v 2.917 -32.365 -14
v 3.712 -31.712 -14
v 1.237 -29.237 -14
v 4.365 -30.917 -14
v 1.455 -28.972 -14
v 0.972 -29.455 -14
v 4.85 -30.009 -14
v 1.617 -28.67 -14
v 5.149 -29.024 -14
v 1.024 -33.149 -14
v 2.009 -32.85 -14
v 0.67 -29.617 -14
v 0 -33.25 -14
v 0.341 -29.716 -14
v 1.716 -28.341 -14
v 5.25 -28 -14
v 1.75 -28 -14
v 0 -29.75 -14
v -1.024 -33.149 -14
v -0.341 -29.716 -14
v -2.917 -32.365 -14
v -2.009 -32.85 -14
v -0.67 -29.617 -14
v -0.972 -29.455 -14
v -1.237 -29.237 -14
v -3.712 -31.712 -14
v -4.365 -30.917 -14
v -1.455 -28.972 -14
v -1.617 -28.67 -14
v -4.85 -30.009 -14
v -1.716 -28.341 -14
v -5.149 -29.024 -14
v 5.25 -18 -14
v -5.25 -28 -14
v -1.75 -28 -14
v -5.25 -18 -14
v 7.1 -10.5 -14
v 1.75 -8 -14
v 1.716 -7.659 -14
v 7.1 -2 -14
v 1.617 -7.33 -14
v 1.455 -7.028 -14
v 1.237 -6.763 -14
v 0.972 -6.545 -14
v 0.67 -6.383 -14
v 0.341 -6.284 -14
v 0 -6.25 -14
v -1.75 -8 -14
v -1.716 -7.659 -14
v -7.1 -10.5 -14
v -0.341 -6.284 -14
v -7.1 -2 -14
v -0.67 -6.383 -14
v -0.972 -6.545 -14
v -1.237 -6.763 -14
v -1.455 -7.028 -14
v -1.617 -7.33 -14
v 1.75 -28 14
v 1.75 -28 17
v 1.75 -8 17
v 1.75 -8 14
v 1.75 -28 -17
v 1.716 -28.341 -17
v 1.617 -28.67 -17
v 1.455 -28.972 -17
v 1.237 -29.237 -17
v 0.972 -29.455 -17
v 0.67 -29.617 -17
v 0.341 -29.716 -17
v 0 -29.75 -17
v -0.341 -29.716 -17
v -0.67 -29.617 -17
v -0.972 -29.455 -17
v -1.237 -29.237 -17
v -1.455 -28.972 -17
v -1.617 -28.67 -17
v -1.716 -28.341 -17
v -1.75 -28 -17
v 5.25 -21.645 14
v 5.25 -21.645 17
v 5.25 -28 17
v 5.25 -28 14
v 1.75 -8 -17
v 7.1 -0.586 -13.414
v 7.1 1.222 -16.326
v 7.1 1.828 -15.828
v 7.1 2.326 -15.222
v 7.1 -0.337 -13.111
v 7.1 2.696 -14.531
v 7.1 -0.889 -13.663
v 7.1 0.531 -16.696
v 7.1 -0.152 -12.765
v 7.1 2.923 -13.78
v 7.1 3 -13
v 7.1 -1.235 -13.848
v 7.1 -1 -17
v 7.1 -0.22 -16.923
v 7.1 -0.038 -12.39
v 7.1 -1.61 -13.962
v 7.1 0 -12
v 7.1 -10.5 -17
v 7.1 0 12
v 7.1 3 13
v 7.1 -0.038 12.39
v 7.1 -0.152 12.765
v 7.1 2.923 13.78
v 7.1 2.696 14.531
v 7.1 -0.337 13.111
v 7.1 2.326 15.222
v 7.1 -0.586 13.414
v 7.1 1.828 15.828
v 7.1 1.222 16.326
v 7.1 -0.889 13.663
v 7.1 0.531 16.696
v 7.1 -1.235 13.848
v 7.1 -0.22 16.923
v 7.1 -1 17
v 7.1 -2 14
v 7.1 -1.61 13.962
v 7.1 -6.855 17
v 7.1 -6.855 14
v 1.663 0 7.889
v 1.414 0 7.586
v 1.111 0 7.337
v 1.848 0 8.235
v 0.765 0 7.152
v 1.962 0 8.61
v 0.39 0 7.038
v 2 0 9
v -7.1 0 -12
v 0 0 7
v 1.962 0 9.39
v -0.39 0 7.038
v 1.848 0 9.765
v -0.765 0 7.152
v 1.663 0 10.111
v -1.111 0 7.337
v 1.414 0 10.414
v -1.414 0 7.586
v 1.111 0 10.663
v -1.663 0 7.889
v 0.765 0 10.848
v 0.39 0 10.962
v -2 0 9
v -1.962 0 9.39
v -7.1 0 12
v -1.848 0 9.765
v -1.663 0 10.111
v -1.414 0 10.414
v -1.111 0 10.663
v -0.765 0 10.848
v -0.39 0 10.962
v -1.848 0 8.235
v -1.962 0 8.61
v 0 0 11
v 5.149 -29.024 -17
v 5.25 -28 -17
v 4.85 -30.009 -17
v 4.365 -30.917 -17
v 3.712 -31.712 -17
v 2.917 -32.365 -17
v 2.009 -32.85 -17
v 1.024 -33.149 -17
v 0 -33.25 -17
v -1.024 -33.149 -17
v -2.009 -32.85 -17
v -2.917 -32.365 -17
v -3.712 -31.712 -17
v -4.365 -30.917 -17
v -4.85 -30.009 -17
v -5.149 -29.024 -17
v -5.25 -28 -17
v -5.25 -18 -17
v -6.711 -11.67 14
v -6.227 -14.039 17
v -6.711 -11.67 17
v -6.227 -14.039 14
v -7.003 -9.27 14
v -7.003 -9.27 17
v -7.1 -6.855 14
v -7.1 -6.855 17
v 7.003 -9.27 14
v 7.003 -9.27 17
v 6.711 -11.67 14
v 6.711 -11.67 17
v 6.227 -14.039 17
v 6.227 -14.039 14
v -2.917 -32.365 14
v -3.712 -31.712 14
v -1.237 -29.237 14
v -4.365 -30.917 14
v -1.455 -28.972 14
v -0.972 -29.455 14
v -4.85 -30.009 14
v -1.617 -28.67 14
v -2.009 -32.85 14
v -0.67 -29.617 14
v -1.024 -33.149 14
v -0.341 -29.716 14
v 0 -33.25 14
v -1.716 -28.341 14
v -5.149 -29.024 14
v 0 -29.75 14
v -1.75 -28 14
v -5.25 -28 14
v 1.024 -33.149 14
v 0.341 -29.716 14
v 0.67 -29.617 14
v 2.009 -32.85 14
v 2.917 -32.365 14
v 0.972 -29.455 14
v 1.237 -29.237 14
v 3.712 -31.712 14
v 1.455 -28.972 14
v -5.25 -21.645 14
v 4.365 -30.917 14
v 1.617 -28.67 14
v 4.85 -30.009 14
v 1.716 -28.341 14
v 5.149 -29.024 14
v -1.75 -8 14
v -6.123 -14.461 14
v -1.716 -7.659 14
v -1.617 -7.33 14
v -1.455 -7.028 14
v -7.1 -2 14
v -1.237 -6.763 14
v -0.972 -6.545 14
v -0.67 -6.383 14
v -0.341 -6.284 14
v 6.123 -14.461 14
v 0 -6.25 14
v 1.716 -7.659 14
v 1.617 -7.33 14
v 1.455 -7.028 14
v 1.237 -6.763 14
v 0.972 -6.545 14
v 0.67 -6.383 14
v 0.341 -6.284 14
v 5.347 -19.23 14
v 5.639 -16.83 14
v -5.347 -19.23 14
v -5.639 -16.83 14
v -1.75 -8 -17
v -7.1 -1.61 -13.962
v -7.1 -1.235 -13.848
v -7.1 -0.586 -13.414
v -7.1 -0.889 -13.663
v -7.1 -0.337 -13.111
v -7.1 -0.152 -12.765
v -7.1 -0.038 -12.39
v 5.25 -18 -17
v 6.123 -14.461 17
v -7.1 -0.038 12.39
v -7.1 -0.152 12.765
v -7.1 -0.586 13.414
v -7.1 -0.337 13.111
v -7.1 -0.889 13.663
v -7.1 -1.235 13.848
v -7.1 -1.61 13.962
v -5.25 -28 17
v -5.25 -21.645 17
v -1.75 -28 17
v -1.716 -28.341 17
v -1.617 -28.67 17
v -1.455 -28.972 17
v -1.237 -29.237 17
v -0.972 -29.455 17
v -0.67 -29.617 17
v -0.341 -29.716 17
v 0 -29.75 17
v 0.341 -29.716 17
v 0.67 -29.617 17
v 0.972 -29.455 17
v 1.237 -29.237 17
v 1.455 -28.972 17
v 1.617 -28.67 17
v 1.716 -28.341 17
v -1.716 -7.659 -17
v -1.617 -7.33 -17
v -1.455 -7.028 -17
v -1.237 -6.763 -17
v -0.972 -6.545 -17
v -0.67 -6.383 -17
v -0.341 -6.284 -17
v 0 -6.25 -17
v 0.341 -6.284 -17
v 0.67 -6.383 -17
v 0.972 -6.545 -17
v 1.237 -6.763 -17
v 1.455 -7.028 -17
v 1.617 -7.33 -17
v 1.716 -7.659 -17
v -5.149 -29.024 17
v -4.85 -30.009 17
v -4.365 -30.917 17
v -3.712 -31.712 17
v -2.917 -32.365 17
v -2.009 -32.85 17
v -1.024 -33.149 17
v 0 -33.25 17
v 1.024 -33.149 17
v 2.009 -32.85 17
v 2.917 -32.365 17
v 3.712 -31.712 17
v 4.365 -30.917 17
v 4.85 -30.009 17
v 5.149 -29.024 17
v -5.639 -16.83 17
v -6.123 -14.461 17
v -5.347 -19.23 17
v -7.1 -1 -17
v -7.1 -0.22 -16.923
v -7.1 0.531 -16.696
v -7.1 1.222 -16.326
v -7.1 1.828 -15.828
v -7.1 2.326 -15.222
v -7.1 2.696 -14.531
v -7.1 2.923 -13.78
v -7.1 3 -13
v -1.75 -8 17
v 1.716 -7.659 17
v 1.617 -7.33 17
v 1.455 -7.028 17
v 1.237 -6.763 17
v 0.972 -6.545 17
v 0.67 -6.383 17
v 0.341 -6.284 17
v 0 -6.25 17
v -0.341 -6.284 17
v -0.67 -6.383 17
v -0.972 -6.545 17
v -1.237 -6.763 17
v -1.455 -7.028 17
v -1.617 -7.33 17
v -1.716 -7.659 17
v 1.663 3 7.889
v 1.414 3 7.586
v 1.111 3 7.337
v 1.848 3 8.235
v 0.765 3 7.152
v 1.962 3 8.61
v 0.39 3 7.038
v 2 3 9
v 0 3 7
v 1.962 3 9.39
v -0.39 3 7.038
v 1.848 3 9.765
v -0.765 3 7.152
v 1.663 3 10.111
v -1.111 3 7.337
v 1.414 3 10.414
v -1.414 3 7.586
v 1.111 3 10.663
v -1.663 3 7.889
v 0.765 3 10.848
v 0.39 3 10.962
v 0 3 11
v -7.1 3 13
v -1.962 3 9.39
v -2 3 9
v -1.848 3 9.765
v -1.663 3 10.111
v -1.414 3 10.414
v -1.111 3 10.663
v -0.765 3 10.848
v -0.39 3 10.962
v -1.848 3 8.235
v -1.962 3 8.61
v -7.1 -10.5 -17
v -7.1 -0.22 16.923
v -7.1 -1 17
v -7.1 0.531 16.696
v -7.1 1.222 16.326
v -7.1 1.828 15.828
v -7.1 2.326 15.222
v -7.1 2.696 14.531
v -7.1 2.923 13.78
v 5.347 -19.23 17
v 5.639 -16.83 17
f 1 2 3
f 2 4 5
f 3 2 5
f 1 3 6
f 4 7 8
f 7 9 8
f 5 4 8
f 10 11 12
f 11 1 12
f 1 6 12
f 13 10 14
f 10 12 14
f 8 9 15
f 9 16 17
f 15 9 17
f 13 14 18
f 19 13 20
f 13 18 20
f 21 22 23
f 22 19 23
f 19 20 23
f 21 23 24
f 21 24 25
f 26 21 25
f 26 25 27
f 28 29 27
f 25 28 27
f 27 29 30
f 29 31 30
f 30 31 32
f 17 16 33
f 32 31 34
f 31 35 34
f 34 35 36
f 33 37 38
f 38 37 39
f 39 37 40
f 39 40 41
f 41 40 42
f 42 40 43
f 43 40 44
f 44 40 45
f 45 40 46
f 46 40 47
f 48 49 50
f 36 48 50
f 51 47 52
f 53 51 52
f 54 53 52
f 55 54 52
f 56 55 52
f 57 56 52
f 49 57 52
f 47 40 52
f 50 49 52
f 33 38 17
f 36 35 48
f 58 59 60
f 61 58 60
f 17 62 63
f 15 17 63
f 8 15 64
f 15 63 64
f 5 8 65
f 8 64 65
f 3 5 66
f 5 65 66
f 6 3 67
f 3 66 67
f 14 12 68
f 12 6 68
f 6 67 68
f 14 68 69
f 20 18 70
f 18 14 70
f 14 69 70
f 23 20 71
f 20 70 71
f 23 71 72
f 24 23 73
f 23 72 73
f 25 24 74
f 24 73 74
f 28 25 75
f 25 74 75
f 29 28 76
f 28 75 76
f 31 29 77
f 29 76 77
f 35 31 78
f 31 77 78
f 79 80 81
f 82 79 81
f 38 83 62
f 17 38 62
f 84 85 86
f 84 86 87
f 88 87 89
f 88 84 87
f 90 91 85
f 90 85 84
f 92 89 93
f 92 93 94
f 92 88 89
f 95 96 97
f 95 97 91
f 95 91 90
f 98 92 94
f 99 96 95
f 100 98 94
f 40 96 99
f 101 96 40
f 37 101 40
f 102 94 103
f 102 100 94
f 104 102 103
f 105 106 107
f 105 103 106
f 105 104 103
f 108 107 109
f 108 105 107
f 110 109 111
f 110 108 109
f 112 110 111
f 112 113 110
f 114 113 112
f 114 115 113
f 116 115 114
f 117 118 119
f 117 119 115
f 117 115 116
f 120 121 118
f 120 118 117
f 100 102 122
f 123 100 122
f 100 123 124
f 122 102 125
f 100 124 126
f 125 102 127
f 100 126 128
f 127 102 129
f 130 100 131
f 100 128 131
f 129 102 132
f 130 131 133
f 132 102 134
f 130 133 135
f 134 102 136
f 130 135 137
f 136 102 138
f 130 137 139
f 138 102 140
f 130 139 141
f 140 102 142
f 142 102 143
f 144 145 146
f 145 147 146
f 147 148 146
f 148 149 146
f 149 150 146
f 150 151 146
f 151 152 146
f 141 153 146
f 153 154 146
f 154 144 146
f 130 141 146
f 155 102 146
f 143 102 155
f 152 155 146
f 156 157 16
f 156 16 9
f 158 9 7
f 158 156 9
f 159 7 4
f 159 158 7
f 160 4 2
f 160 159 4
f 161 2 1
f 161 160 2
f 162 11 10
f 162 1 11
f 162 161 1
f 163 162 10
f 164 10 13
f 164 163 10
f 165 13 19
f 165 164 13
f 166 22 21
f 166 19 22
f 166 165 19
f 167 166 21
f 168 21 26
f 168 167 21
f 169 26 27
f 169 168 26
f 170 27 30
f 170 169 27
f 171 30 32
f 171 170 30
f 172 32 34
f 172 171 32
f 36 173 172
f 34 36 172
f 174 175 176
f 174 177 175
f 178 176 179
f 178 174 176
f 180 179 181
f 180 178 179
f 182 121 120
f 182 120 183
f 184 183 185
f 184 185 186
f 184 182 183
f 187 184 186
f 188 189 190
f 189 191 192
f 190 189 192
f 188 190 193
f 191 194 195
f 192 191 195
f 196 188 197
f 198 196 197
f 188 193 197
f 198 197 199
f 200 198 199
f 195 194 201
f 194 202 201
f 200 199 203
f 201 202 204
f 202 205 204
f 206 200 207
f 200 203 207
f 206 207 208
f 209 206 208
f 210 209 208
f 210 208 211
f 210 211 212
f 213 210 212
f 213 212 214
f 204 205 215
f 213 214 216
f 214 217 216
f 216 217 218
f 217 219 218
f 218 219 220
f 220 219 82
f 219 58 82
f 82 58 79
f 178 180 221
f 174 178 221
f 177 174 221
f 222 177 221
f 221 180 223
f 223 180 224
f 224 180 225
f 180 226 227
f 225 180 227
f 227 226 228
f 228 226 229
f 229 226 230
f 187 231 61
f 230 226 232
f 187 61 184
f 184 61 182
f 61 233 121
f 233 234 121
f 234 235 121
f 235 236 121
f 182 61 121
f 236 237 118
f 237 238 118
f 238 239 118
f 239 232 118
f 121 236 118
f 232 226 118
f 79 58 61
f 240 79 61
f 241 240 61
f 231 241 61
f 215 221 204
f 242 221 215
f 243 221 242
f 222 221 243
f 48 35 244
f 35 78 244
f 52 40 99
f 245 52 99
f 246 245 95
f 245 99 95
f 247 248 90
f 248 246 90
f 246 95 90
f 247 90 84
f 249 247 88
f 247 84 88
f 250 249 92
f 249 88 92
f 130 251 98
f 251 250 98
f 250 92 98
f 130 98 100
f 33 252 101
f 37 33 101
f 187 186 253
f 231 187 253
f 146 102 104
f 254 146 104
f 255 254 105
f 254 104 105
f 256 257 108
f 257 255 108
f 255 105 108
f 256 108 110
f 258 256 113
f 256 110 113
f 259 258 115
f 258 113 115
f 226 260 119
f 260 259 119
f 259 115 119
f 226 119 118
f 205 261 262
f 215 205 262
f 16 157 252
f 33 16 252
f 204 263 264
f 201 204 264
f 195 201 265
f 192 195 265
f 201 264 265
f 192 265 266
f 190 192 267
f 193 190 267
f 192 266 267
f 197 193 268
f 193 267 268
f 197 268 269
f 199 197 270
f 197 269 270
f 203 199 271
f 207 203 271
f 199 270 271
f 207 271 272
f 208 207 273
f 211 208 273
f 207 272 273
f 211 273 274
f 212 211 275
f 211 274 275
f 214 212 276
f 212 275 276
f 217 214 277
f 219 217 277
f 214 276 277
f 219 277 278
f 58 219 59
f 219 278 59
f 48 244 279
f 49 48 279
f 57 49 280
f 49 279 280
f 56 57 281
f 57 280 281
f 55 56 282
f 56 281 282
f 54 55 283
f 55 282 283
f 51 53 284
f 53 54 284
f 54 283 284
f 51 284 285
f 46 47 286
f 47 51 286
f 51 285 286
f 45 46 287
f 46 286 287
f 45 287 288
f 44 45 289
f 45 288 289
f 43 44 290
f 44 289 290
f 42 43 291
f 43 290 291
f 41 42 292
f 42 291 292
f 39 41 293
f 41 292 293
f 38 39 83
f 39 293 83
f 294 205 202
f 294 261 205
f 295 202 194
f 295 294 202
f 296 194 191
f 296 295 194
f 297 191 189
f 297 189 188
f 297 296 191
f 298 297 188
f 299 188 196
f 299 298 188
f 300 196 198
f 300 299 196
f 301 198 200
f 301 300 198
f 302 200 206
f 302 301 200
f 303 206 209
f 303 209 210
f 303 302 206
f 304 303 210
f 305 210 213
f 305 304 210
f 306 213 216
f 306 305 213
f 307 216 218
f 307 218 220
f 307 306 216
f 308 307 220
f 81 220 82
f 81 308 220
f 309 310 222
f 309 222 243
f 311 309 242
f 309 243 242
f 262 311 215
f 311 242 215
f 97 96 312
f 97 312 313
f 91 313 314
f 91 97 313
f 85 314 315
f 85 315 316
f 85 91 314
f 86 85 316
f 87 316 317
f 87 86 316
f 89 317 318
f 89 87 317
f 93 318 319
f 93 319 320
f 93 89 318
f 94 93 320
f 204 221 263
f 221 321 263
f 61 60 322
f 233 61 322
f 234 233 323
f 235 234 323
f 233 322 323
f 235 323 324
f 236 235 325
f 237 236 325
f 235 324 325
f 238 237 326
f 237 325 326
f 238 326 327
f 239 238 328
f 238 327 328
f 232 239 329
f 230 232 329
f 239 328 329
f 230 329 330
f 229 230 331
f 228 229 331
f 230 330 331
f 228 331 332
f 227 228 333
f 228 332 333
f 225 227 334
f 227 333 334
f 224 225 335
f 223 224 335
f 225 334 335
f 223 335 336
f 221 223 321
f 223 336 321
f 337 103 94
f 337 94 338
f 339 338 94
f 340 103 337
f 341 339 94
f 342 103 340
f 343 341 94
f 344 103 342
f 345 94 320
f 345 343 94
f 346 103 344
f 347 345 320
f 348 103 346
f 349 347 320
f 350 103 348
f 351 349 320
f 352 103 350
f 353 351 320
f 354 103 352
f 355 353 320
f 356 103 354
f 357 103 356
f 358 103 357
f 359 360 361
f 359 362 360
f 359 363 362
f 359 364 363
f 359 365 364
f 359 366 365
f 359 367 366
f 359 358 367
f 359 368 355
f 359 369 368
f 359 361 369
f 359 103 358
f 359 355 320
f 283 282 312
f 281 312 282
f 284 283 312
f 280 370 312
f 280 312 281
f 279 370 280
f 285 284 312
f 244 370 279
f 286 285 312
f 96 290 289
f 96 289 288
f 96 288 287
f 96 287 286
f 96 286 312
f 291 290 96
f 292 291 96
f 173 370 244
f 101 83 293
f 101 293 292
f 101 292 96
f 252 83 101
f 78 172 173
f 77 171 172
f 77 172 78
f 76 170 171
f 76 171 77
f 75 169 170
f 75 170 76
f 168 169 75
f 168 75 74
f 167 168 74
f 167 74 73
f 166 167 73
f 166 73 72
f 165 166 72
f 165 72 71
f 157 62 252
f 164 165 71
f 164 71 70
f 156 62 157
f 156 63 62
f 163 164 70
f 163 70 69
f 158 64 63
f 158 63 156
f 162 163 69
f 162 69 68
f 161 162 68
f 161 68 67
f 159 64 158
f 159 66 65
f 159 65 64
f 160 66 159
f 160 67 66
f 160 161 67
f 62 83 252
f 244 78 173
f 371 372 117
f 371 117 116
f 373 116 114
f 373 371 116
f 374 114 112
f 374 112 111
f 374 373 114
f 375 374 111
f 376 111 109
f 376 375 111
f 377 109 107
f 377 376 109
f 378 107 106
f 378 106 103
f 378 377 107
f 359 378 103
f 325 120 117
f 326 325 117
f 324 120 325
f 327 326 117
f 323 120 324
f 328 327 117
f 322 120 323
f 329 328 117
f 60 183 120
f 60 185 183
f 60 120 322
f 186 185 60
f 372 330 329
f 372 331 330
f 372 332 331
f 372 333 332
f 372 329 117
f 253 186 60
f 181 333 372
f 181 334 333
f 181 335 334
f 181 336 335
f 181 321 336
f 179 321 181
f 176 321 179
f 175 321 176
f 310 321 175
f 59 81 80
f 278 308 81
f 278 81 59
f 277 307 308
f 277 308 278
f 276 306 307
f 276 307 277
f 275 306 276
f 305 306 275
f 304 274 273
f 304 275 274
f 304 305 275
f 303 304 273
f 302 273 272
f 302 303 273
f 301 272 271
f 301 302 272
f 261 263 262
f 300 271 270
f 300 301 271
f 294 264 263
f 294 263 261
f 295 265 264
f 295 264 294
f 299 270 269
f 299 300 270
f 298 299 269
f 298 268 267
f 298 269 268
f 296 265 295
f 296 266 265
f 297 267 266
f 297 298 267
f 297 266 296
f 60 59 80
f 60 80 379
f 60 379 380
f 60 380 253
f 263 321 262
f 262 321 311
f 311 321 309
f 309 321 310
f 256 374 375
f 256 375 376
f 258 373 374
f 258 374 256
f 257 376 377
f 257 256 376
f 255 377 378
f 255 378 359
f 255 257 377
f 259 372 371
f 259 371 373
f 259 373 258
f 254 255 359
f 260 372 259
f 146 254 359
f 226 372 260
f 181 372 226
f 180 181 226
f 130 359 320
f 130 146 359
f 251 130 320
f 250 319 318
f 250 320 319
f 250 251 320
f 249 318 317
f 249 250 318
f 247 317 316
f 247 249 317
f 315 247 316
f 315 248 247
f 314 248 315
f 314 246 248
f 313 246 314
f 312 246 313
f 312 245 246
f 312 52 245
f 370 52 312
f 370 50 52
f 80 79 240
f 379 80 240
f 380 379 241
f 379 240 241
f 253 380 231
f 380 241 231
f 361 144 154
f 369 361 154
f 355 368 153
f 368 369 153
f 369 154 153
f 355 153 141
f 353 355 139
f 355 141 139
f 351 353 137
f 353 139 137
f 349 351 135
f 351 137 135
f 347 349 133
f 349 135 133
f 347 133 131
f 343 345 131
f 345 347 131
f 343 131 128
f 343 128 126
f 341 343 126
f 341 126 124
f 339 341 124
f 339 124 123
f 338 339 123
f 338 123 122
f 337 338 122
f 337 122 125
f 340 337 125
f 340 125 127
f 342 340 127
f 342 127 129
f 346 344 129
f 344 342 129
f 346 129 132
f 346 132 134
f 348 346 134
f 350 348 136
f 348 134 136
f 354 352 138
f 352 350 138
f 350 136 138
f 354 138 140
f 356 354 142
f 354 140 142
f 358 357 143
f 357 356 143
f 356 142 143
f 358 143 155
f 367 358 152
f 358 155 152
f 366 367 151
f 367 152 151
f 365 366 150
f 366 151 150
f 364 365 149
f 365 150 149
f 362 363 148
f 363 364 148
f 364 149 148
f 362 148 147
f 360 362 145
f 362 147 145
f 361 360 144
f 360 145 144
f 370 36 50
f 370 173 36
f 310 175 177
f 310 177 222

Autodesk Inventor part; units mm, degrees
ref_plane "YZ Plane" through (0, 0, 0) normal (1, 0, 0) x (0, 1, 0)
ref_plane "XZ Plane" through (0, 0, 0) normal (0, 1, 0) x (-1, 0, 0)
ref_plane "XY Plane" through (0, 0, 0) normal (0, 0, 1) x (1, 0, 0)
sketch "Sketch1" plane through (0, 0, 0) normal (0, 1, 0) x (-1, 0, 0)
  line L0 (7.1, -17) -> (-7.1, -17)
  line L1 (-7.1, -17) -> (-7.1, 17)
  line L2 (-7.1, 17) -> (7.1, 17)
  line L3 (7.1, 17) -> (7.1, -17)
  line L4 (7.1, -17) -> (-7.1, 17) construction
  line L5 (-7.1, -17) -> (7.1, 17) construction
  circle A0 centre (0, 9) radius 2
  point P0 (0, 0)
  dimension "d0" = 14.2
  dimension "d1" = 34
  dimension "d4" = 4
  dimension "d5" = 8
  dimension "d6" = 7.1
extrude "Extrusion1" add sketch "Sketch1" along normal blind 3
sketch "Sketch2" plane through (-7.1, 0, 17) normal (0, 0, 1) x (1, 0, 0)
  line L0 (7.1, -28) -> (7.1, -8) construction
  line L1 (8.85, -28) -> (8.85, -8)
  line L2 (5.35, -8) -> (5.35, -28)
  arc A0 (5.35, -28) -> (8.85, -28) centre (7.1, -28) ccw
  arc A1 (8.85, -8) -> (5.35, -8) centre (7.1, -8) ccw
  line L3 (0, 0) -> (0, 3) projected
  line L4 (0, 0) -> (14.2, 0) projected
  line L5 (1.85, -28) -> (1.85, -8)
  arc A2 (12.35, -8) -> (1.85, -8) centre (7.1, -8) ccw
  line L6 (12.35, -8) -> (12.35, -28)
  arc A3 (1.85, -28) -> (12.35, -28) centre (7.1, -28) ccw
  line L7 (0, 0) -> (0, -10.5)
  line L8 (0, -10.5) -> (1.85, -18)
  line L9 (14.2, 0) -> (14.2, -10.5)
  line L10 (14.2, -10.5) -> (12.35, -18)
  point P0 (7.1, 0)
  point P1 (7.1, -18)
  point P2 (8.85, -18)
  dimension "d7" = 7.1
  dimension "d8" = 3.5
  dimension "d9" = 20
  dimension "d10" = 18
  dimension "d11" = 3.5
extrude "Extrusion2" add sketch "Sketch2" against normal blind 3
fillet "Fillet1" radius 30 4 edges at (7.1, -10.5, 15.5) (5.25, -18, 15.5) (-7.1, -10.5, 15.5) (-5.25, -18, 15.5)
mirror "Mirror1" about plane through (0, 0, 0) normal (0, 0, 1) of "Extrusion2"
fillet "Fillet2" radius 4 2 edges at (0, 3, 17) (0, 3, -17)
fillet "Fillet3" radius 2 2 edges at (0, 0, 14) (0, 0, -14)
properties part number "SoporteSensorDeInterrupciones"
